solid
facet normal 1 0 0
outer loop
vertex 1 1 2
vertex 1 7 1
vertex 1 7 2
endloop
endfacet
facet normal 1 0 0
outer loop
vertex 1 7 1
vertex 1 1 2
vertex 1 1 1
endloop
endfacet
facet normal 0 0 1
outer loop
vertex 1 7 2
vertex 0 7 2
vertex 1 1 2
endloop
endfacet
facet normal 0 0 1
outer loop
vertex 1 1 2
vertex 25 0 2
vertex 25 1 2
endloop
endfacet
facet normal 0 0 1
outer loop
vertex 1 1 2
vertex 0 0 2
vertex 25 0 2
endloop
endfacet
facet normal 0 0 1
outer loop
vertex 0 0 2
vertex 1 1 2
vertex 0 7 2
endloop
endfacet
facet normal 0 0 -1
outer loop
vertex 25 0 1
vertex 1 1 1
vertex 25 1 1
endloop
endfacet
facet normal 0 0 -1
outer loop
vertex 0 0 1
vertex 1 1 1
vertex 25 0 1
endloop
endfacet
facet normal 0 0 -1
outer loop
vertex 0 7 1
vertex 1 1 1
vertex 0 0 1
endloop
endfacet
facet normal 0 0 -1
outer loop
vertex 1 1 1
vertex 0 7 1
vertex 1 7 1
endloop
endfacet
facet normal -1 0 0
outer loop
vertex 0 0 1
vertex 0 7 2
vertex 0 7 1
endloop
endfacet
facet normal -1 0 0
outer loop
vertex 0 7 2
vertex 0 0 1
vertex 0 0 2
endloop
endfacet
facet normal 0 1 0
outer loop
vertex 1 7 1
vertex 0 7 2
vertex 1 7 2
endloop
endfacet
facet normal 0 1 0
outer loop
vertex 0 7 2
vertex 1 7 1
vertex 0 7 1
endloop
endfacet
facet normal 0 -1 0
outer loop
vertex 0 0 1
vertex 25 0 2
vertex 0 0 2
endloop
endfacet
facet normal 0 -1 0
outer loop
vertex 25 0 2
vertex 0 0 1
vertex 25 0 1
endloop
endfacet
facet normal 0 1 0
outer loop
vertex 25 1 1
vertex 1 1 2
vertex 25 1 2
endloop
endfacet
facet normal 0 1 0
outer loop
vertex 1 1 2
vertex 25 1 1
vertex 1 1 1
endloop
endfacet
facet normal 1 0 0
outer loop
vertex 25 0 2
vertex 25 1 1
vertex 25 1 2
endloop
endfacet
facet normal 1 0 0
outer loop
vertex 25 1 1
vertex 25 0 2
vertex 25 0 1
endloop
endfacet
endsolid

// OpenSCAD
module List_Viz_Generator (h, w, iterations, min_len, max_len) {
    // Randomizing
    rand_len = rands(min_len, max_len, iterations);
    rand_dir = rands(1, 4, iterations);
    // Stored values
    num_height = 1;
    trans_x = 0;
    trans_y = 0;
    // Building the list cubes
        for(i=[0:1:iterations]){
            echo(round(rand_len[i]));
            echo(round(rand_dir[i]));
            translate([trans_x, trans_y, num_height*h]) {
                if (round(rand_dir[i]) == 1)
                    {
                    if (round(rand_dir[i-1]) == 1 || round(rand_dir[i-1]) == 3) {num_height = num_height + 1;}
                    trans_x = trans_x + round(rand_len[i]);
                    cube([round(rand_len[i]), w, h]);
                    }
                else if (round(rand_dir[i]) == 2) 
                    {
                    if (round(rand_dir[i-1]) == 2 || round(rand_dir[i-1]) == 4) {num_height = num_height + 1;}
                    trans_y = trans_y + round(rand_len[i]);
                    cube([w, round(rand_len[i]), h]);
                    }
                else if (round(rand_dir[i]) == 3)
                    {
                    if (round(rand_dir[i-1]) == 1 || round(rand_dir[i-1]) == 3) {num_height = num_height + 1;}
                    trans_x = trans_x - round(rand_len[i]);
                    cube([-round(rand_len[i]), w, h]);
                    }
                else
                    {
                    if (round(rand_dir[i-1]) == 2 || round(rand_dir[i-1]) == 4) {num_height = num_height + 1;}
                    trans_y = trans_y - round(rand_len[i]);
                    cube([w, -round(rand_len[i]), h]);
                    }
            }
        }
}
      
List_Viz_Generator(1, 1, 10, 1, 30);
